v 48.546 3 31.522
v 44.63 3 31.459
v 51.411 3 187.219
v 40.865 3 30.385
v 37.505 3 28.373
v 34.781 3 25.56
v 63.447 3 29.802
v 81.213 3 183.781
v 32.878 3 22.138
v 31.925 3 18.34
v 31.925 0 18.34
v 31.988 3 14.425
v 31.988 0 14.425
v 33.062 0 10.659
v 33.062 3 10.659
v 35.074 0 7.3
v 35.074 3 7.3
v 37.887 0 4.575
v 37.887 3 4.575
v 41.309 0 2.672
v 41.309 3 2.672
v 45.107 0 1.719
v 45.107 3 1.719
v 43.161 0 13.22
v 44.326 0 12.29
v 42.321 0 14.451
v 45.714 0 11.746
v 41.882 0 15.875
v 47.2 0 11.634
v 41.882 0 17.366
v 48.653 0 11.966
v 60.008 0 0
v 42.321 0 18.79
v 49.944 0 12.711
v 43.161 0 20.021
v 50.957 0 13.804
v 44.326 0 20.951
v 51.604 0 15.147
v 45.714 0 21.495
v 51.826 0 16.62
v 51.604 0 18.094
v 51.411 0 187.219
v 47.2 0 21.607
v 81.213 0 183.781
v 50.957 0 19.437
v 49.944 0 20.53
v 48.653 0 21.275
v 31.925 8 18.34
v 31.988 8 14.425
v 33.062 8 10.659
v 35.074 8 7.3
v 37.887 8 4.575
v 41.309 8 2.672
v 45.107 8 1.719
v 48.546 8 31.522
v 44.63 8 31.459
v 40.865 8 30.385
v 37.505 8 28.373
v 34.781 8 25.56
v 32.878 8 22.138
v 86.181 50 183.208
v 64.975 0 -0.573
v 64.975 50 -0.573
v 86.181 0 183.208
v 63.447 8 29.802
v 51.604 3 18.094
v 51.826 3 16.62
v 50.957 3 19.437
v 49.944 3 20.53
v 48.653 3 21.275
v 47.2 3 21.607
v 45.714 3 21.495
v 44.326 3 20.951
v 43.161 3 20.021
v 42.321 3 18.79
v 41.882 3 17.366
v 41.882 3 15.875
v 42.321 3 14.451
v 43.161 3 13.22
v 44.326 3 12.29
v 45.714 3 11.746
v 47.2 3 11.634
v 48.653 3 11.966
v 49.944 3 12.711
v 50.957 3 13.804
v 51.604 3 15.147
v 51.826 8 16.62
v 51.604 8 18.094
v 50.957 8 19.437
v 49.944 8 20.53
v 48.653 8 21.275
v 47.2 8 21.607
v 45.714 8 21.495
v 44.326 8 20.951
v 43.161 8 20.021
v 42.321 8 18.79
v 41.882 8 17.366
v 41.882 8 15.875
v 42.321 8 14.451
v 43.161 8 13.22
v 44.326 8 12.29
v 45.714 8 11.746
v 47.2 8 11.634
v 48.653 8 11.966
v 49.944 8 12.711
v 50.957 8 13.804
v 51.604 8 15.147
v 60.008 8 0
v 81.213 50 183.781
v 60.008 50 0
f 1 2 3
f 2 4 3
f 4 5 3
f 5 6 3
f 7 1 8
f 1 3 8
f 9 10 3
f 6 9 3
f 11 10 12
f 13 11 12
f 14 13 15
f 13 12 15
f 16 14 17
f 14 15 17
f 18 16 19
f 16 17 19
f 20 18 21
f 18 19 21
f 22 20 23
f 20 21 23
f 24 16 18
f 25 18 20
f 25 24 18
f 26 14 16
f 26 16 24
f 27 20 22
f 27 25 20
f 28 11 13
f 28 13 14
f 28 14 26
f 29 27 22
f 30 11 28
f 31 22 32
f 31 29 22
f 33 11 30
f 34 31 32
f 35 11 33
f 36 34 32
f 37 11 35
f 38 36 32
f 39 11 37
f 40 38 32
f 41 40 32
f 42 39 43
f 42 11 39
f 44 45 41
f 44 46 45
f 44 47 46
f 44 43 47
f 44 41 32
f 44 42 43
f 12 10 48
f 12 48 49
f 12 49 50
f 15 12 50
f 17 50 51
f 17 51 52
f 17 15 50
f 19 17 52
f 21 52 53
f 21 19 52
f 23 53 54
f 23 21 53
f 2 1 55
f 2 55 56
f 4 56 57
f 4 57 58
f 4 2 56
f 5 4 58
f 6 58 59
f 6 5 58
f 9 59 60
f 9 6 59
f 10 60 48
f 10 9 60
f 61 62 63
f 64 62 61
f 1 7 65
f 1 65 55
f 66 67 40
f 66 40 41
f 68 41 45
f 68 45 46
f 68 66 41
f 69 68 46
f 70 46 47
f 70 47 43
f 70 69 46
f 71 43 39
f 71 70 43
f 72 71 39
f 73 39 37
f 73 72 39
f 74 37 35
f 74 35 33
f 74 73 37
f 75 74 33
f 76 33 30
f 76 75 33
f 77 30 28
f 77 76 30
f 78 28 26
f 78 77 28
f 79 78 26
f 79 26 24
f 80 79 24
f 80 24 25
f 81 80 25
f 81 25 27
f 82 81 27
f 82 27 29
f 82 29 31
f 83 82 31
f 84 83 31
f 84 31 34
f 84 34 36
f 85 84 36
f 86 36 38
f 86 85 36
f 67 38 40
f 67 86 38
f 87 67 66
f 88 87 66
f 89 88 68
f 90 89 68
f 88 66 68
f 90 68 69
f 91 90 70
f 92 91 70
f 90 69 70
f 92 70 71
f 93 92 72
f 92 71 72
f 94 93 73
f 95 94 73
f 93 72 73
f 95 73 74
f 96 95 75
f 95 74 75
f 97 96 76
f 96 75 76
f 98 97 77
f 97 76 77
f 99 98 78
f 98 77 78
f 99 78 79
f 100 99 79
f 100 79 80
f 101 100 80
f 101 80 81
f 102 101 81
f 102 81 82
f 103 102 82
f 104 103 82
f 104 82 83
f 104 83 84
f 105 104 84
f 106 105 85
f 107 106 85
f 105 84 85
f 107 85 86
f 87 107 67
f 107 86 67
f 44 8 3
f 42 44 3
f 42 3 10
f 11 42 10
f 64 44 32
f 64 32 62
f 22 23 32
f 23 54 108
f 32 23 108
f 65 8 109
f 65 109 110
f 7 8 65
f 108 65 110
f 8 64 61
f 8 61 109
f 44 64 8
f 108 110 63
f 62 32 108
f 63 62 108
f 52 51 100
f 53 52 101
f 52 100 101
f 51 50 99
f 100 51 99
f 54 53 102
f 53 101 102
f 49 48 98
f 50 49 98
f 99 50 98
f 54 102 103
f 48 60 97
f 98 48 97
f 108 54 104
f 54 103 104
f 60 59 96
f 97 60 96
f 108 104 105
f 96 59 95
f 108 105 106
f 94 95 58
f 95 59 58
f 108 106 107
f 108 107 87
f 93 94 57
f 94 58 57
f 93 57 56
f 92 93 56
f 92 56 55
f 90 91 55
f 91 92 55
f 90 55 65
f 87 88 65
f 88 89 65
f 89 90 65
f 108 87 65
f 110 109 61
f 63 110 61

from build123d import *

# Parameters (mm, degrees)
F1_DEPTH = 50
F3_R     = 5
F4_DEPTH = 5
F5_DEPTH = 3


with BuildPart() as f1:
    # F0 (on Front) → F1 (new body)
    with BuildSketch(Plane.XZ):
        Polygon((86.1805300464, 183.2075325962), (81.2134853671, 183.7806531362), (60.0080253898, 0), (64.9750700692, -0.5731205399), align=None)
    extrude(amount=-F1_DEPTH)

    # F3 (on offset) → F4 (join)
    with BuildSketch(Plane.XZ.offset(-3)):
        with BuildLine():
            Line((45.1068913518, 1.7193616198), (60.0080253898, 0))
            Line((60.0080253898, 0), (63.4467486294, 29.8022680761))
            Line((63.4467486294, 29.8022680761), (48.5456145913, 31.5216296959))
            ThreePointArc((48.5456145913, 31.5216296959), (37.5053321271, 28.3729607019), (31.925118881, 18.3398568227))
            ThreePointArc((31.925118881, 18.3398568227), (35.0737879275, 7.2995748134), (45.1068913518, 1.7193616198))
        make_face()
        with Locations((46.8262529715, 16.6204956578)):
            Circle(F3_R, mode=Mode.SUBTRACT)
    extrude(amount=-F4_DEPTH)

    # F3 (on offset) → F5 (join)
    with BuildSketch(Plane.XZ.offset(-3)):
        with BuildLine():
            Line((45.1068913518, 1.7193616198), (60.0080253898, 0))
            Line((60.0080253898, 0), (63.4467486294, 29.8022680761))
            Line((63.4467486294, 29.8022680761), (48.5456145913, 31.5216296959))
            ThreePointArc((48.5456145913, 31.5216296959), (37.5053321271, 28.3729607019), (31.925118881, 18.3398568227))
            ThreePointArc((31.925118881, 18.3398568227), (35.0737879275, 7.2995748134), (45.1068913518, 1.7193616198))
        make_face()
        with Locations((46.8262529715, 16.6204956578)):
            Circle(F3_R, mode=Mode.SUBTRACT)
        with BuildLine():
            Line((48.5456145913, 31.5216296959), (63.4467486294, 29.8022680761))
            Line((63.4467486294, 29.8022680761), (81.2134853671, 183.7806531362))
            Line((81.2134853671, 183.7806531362), (51.411217291, 187.2193763757))
            Line((51.411217291, 187.2193763757), (31.925118881, 18.3398568227))
            ThreePointArc((31.925118881, 18.3398568227), (37.5053321271, 28.3729607019), (48.5456145913, 31.5216296959))
        make_face()
    extrude(amount=F5_DEPTH)


solid = f1.part
